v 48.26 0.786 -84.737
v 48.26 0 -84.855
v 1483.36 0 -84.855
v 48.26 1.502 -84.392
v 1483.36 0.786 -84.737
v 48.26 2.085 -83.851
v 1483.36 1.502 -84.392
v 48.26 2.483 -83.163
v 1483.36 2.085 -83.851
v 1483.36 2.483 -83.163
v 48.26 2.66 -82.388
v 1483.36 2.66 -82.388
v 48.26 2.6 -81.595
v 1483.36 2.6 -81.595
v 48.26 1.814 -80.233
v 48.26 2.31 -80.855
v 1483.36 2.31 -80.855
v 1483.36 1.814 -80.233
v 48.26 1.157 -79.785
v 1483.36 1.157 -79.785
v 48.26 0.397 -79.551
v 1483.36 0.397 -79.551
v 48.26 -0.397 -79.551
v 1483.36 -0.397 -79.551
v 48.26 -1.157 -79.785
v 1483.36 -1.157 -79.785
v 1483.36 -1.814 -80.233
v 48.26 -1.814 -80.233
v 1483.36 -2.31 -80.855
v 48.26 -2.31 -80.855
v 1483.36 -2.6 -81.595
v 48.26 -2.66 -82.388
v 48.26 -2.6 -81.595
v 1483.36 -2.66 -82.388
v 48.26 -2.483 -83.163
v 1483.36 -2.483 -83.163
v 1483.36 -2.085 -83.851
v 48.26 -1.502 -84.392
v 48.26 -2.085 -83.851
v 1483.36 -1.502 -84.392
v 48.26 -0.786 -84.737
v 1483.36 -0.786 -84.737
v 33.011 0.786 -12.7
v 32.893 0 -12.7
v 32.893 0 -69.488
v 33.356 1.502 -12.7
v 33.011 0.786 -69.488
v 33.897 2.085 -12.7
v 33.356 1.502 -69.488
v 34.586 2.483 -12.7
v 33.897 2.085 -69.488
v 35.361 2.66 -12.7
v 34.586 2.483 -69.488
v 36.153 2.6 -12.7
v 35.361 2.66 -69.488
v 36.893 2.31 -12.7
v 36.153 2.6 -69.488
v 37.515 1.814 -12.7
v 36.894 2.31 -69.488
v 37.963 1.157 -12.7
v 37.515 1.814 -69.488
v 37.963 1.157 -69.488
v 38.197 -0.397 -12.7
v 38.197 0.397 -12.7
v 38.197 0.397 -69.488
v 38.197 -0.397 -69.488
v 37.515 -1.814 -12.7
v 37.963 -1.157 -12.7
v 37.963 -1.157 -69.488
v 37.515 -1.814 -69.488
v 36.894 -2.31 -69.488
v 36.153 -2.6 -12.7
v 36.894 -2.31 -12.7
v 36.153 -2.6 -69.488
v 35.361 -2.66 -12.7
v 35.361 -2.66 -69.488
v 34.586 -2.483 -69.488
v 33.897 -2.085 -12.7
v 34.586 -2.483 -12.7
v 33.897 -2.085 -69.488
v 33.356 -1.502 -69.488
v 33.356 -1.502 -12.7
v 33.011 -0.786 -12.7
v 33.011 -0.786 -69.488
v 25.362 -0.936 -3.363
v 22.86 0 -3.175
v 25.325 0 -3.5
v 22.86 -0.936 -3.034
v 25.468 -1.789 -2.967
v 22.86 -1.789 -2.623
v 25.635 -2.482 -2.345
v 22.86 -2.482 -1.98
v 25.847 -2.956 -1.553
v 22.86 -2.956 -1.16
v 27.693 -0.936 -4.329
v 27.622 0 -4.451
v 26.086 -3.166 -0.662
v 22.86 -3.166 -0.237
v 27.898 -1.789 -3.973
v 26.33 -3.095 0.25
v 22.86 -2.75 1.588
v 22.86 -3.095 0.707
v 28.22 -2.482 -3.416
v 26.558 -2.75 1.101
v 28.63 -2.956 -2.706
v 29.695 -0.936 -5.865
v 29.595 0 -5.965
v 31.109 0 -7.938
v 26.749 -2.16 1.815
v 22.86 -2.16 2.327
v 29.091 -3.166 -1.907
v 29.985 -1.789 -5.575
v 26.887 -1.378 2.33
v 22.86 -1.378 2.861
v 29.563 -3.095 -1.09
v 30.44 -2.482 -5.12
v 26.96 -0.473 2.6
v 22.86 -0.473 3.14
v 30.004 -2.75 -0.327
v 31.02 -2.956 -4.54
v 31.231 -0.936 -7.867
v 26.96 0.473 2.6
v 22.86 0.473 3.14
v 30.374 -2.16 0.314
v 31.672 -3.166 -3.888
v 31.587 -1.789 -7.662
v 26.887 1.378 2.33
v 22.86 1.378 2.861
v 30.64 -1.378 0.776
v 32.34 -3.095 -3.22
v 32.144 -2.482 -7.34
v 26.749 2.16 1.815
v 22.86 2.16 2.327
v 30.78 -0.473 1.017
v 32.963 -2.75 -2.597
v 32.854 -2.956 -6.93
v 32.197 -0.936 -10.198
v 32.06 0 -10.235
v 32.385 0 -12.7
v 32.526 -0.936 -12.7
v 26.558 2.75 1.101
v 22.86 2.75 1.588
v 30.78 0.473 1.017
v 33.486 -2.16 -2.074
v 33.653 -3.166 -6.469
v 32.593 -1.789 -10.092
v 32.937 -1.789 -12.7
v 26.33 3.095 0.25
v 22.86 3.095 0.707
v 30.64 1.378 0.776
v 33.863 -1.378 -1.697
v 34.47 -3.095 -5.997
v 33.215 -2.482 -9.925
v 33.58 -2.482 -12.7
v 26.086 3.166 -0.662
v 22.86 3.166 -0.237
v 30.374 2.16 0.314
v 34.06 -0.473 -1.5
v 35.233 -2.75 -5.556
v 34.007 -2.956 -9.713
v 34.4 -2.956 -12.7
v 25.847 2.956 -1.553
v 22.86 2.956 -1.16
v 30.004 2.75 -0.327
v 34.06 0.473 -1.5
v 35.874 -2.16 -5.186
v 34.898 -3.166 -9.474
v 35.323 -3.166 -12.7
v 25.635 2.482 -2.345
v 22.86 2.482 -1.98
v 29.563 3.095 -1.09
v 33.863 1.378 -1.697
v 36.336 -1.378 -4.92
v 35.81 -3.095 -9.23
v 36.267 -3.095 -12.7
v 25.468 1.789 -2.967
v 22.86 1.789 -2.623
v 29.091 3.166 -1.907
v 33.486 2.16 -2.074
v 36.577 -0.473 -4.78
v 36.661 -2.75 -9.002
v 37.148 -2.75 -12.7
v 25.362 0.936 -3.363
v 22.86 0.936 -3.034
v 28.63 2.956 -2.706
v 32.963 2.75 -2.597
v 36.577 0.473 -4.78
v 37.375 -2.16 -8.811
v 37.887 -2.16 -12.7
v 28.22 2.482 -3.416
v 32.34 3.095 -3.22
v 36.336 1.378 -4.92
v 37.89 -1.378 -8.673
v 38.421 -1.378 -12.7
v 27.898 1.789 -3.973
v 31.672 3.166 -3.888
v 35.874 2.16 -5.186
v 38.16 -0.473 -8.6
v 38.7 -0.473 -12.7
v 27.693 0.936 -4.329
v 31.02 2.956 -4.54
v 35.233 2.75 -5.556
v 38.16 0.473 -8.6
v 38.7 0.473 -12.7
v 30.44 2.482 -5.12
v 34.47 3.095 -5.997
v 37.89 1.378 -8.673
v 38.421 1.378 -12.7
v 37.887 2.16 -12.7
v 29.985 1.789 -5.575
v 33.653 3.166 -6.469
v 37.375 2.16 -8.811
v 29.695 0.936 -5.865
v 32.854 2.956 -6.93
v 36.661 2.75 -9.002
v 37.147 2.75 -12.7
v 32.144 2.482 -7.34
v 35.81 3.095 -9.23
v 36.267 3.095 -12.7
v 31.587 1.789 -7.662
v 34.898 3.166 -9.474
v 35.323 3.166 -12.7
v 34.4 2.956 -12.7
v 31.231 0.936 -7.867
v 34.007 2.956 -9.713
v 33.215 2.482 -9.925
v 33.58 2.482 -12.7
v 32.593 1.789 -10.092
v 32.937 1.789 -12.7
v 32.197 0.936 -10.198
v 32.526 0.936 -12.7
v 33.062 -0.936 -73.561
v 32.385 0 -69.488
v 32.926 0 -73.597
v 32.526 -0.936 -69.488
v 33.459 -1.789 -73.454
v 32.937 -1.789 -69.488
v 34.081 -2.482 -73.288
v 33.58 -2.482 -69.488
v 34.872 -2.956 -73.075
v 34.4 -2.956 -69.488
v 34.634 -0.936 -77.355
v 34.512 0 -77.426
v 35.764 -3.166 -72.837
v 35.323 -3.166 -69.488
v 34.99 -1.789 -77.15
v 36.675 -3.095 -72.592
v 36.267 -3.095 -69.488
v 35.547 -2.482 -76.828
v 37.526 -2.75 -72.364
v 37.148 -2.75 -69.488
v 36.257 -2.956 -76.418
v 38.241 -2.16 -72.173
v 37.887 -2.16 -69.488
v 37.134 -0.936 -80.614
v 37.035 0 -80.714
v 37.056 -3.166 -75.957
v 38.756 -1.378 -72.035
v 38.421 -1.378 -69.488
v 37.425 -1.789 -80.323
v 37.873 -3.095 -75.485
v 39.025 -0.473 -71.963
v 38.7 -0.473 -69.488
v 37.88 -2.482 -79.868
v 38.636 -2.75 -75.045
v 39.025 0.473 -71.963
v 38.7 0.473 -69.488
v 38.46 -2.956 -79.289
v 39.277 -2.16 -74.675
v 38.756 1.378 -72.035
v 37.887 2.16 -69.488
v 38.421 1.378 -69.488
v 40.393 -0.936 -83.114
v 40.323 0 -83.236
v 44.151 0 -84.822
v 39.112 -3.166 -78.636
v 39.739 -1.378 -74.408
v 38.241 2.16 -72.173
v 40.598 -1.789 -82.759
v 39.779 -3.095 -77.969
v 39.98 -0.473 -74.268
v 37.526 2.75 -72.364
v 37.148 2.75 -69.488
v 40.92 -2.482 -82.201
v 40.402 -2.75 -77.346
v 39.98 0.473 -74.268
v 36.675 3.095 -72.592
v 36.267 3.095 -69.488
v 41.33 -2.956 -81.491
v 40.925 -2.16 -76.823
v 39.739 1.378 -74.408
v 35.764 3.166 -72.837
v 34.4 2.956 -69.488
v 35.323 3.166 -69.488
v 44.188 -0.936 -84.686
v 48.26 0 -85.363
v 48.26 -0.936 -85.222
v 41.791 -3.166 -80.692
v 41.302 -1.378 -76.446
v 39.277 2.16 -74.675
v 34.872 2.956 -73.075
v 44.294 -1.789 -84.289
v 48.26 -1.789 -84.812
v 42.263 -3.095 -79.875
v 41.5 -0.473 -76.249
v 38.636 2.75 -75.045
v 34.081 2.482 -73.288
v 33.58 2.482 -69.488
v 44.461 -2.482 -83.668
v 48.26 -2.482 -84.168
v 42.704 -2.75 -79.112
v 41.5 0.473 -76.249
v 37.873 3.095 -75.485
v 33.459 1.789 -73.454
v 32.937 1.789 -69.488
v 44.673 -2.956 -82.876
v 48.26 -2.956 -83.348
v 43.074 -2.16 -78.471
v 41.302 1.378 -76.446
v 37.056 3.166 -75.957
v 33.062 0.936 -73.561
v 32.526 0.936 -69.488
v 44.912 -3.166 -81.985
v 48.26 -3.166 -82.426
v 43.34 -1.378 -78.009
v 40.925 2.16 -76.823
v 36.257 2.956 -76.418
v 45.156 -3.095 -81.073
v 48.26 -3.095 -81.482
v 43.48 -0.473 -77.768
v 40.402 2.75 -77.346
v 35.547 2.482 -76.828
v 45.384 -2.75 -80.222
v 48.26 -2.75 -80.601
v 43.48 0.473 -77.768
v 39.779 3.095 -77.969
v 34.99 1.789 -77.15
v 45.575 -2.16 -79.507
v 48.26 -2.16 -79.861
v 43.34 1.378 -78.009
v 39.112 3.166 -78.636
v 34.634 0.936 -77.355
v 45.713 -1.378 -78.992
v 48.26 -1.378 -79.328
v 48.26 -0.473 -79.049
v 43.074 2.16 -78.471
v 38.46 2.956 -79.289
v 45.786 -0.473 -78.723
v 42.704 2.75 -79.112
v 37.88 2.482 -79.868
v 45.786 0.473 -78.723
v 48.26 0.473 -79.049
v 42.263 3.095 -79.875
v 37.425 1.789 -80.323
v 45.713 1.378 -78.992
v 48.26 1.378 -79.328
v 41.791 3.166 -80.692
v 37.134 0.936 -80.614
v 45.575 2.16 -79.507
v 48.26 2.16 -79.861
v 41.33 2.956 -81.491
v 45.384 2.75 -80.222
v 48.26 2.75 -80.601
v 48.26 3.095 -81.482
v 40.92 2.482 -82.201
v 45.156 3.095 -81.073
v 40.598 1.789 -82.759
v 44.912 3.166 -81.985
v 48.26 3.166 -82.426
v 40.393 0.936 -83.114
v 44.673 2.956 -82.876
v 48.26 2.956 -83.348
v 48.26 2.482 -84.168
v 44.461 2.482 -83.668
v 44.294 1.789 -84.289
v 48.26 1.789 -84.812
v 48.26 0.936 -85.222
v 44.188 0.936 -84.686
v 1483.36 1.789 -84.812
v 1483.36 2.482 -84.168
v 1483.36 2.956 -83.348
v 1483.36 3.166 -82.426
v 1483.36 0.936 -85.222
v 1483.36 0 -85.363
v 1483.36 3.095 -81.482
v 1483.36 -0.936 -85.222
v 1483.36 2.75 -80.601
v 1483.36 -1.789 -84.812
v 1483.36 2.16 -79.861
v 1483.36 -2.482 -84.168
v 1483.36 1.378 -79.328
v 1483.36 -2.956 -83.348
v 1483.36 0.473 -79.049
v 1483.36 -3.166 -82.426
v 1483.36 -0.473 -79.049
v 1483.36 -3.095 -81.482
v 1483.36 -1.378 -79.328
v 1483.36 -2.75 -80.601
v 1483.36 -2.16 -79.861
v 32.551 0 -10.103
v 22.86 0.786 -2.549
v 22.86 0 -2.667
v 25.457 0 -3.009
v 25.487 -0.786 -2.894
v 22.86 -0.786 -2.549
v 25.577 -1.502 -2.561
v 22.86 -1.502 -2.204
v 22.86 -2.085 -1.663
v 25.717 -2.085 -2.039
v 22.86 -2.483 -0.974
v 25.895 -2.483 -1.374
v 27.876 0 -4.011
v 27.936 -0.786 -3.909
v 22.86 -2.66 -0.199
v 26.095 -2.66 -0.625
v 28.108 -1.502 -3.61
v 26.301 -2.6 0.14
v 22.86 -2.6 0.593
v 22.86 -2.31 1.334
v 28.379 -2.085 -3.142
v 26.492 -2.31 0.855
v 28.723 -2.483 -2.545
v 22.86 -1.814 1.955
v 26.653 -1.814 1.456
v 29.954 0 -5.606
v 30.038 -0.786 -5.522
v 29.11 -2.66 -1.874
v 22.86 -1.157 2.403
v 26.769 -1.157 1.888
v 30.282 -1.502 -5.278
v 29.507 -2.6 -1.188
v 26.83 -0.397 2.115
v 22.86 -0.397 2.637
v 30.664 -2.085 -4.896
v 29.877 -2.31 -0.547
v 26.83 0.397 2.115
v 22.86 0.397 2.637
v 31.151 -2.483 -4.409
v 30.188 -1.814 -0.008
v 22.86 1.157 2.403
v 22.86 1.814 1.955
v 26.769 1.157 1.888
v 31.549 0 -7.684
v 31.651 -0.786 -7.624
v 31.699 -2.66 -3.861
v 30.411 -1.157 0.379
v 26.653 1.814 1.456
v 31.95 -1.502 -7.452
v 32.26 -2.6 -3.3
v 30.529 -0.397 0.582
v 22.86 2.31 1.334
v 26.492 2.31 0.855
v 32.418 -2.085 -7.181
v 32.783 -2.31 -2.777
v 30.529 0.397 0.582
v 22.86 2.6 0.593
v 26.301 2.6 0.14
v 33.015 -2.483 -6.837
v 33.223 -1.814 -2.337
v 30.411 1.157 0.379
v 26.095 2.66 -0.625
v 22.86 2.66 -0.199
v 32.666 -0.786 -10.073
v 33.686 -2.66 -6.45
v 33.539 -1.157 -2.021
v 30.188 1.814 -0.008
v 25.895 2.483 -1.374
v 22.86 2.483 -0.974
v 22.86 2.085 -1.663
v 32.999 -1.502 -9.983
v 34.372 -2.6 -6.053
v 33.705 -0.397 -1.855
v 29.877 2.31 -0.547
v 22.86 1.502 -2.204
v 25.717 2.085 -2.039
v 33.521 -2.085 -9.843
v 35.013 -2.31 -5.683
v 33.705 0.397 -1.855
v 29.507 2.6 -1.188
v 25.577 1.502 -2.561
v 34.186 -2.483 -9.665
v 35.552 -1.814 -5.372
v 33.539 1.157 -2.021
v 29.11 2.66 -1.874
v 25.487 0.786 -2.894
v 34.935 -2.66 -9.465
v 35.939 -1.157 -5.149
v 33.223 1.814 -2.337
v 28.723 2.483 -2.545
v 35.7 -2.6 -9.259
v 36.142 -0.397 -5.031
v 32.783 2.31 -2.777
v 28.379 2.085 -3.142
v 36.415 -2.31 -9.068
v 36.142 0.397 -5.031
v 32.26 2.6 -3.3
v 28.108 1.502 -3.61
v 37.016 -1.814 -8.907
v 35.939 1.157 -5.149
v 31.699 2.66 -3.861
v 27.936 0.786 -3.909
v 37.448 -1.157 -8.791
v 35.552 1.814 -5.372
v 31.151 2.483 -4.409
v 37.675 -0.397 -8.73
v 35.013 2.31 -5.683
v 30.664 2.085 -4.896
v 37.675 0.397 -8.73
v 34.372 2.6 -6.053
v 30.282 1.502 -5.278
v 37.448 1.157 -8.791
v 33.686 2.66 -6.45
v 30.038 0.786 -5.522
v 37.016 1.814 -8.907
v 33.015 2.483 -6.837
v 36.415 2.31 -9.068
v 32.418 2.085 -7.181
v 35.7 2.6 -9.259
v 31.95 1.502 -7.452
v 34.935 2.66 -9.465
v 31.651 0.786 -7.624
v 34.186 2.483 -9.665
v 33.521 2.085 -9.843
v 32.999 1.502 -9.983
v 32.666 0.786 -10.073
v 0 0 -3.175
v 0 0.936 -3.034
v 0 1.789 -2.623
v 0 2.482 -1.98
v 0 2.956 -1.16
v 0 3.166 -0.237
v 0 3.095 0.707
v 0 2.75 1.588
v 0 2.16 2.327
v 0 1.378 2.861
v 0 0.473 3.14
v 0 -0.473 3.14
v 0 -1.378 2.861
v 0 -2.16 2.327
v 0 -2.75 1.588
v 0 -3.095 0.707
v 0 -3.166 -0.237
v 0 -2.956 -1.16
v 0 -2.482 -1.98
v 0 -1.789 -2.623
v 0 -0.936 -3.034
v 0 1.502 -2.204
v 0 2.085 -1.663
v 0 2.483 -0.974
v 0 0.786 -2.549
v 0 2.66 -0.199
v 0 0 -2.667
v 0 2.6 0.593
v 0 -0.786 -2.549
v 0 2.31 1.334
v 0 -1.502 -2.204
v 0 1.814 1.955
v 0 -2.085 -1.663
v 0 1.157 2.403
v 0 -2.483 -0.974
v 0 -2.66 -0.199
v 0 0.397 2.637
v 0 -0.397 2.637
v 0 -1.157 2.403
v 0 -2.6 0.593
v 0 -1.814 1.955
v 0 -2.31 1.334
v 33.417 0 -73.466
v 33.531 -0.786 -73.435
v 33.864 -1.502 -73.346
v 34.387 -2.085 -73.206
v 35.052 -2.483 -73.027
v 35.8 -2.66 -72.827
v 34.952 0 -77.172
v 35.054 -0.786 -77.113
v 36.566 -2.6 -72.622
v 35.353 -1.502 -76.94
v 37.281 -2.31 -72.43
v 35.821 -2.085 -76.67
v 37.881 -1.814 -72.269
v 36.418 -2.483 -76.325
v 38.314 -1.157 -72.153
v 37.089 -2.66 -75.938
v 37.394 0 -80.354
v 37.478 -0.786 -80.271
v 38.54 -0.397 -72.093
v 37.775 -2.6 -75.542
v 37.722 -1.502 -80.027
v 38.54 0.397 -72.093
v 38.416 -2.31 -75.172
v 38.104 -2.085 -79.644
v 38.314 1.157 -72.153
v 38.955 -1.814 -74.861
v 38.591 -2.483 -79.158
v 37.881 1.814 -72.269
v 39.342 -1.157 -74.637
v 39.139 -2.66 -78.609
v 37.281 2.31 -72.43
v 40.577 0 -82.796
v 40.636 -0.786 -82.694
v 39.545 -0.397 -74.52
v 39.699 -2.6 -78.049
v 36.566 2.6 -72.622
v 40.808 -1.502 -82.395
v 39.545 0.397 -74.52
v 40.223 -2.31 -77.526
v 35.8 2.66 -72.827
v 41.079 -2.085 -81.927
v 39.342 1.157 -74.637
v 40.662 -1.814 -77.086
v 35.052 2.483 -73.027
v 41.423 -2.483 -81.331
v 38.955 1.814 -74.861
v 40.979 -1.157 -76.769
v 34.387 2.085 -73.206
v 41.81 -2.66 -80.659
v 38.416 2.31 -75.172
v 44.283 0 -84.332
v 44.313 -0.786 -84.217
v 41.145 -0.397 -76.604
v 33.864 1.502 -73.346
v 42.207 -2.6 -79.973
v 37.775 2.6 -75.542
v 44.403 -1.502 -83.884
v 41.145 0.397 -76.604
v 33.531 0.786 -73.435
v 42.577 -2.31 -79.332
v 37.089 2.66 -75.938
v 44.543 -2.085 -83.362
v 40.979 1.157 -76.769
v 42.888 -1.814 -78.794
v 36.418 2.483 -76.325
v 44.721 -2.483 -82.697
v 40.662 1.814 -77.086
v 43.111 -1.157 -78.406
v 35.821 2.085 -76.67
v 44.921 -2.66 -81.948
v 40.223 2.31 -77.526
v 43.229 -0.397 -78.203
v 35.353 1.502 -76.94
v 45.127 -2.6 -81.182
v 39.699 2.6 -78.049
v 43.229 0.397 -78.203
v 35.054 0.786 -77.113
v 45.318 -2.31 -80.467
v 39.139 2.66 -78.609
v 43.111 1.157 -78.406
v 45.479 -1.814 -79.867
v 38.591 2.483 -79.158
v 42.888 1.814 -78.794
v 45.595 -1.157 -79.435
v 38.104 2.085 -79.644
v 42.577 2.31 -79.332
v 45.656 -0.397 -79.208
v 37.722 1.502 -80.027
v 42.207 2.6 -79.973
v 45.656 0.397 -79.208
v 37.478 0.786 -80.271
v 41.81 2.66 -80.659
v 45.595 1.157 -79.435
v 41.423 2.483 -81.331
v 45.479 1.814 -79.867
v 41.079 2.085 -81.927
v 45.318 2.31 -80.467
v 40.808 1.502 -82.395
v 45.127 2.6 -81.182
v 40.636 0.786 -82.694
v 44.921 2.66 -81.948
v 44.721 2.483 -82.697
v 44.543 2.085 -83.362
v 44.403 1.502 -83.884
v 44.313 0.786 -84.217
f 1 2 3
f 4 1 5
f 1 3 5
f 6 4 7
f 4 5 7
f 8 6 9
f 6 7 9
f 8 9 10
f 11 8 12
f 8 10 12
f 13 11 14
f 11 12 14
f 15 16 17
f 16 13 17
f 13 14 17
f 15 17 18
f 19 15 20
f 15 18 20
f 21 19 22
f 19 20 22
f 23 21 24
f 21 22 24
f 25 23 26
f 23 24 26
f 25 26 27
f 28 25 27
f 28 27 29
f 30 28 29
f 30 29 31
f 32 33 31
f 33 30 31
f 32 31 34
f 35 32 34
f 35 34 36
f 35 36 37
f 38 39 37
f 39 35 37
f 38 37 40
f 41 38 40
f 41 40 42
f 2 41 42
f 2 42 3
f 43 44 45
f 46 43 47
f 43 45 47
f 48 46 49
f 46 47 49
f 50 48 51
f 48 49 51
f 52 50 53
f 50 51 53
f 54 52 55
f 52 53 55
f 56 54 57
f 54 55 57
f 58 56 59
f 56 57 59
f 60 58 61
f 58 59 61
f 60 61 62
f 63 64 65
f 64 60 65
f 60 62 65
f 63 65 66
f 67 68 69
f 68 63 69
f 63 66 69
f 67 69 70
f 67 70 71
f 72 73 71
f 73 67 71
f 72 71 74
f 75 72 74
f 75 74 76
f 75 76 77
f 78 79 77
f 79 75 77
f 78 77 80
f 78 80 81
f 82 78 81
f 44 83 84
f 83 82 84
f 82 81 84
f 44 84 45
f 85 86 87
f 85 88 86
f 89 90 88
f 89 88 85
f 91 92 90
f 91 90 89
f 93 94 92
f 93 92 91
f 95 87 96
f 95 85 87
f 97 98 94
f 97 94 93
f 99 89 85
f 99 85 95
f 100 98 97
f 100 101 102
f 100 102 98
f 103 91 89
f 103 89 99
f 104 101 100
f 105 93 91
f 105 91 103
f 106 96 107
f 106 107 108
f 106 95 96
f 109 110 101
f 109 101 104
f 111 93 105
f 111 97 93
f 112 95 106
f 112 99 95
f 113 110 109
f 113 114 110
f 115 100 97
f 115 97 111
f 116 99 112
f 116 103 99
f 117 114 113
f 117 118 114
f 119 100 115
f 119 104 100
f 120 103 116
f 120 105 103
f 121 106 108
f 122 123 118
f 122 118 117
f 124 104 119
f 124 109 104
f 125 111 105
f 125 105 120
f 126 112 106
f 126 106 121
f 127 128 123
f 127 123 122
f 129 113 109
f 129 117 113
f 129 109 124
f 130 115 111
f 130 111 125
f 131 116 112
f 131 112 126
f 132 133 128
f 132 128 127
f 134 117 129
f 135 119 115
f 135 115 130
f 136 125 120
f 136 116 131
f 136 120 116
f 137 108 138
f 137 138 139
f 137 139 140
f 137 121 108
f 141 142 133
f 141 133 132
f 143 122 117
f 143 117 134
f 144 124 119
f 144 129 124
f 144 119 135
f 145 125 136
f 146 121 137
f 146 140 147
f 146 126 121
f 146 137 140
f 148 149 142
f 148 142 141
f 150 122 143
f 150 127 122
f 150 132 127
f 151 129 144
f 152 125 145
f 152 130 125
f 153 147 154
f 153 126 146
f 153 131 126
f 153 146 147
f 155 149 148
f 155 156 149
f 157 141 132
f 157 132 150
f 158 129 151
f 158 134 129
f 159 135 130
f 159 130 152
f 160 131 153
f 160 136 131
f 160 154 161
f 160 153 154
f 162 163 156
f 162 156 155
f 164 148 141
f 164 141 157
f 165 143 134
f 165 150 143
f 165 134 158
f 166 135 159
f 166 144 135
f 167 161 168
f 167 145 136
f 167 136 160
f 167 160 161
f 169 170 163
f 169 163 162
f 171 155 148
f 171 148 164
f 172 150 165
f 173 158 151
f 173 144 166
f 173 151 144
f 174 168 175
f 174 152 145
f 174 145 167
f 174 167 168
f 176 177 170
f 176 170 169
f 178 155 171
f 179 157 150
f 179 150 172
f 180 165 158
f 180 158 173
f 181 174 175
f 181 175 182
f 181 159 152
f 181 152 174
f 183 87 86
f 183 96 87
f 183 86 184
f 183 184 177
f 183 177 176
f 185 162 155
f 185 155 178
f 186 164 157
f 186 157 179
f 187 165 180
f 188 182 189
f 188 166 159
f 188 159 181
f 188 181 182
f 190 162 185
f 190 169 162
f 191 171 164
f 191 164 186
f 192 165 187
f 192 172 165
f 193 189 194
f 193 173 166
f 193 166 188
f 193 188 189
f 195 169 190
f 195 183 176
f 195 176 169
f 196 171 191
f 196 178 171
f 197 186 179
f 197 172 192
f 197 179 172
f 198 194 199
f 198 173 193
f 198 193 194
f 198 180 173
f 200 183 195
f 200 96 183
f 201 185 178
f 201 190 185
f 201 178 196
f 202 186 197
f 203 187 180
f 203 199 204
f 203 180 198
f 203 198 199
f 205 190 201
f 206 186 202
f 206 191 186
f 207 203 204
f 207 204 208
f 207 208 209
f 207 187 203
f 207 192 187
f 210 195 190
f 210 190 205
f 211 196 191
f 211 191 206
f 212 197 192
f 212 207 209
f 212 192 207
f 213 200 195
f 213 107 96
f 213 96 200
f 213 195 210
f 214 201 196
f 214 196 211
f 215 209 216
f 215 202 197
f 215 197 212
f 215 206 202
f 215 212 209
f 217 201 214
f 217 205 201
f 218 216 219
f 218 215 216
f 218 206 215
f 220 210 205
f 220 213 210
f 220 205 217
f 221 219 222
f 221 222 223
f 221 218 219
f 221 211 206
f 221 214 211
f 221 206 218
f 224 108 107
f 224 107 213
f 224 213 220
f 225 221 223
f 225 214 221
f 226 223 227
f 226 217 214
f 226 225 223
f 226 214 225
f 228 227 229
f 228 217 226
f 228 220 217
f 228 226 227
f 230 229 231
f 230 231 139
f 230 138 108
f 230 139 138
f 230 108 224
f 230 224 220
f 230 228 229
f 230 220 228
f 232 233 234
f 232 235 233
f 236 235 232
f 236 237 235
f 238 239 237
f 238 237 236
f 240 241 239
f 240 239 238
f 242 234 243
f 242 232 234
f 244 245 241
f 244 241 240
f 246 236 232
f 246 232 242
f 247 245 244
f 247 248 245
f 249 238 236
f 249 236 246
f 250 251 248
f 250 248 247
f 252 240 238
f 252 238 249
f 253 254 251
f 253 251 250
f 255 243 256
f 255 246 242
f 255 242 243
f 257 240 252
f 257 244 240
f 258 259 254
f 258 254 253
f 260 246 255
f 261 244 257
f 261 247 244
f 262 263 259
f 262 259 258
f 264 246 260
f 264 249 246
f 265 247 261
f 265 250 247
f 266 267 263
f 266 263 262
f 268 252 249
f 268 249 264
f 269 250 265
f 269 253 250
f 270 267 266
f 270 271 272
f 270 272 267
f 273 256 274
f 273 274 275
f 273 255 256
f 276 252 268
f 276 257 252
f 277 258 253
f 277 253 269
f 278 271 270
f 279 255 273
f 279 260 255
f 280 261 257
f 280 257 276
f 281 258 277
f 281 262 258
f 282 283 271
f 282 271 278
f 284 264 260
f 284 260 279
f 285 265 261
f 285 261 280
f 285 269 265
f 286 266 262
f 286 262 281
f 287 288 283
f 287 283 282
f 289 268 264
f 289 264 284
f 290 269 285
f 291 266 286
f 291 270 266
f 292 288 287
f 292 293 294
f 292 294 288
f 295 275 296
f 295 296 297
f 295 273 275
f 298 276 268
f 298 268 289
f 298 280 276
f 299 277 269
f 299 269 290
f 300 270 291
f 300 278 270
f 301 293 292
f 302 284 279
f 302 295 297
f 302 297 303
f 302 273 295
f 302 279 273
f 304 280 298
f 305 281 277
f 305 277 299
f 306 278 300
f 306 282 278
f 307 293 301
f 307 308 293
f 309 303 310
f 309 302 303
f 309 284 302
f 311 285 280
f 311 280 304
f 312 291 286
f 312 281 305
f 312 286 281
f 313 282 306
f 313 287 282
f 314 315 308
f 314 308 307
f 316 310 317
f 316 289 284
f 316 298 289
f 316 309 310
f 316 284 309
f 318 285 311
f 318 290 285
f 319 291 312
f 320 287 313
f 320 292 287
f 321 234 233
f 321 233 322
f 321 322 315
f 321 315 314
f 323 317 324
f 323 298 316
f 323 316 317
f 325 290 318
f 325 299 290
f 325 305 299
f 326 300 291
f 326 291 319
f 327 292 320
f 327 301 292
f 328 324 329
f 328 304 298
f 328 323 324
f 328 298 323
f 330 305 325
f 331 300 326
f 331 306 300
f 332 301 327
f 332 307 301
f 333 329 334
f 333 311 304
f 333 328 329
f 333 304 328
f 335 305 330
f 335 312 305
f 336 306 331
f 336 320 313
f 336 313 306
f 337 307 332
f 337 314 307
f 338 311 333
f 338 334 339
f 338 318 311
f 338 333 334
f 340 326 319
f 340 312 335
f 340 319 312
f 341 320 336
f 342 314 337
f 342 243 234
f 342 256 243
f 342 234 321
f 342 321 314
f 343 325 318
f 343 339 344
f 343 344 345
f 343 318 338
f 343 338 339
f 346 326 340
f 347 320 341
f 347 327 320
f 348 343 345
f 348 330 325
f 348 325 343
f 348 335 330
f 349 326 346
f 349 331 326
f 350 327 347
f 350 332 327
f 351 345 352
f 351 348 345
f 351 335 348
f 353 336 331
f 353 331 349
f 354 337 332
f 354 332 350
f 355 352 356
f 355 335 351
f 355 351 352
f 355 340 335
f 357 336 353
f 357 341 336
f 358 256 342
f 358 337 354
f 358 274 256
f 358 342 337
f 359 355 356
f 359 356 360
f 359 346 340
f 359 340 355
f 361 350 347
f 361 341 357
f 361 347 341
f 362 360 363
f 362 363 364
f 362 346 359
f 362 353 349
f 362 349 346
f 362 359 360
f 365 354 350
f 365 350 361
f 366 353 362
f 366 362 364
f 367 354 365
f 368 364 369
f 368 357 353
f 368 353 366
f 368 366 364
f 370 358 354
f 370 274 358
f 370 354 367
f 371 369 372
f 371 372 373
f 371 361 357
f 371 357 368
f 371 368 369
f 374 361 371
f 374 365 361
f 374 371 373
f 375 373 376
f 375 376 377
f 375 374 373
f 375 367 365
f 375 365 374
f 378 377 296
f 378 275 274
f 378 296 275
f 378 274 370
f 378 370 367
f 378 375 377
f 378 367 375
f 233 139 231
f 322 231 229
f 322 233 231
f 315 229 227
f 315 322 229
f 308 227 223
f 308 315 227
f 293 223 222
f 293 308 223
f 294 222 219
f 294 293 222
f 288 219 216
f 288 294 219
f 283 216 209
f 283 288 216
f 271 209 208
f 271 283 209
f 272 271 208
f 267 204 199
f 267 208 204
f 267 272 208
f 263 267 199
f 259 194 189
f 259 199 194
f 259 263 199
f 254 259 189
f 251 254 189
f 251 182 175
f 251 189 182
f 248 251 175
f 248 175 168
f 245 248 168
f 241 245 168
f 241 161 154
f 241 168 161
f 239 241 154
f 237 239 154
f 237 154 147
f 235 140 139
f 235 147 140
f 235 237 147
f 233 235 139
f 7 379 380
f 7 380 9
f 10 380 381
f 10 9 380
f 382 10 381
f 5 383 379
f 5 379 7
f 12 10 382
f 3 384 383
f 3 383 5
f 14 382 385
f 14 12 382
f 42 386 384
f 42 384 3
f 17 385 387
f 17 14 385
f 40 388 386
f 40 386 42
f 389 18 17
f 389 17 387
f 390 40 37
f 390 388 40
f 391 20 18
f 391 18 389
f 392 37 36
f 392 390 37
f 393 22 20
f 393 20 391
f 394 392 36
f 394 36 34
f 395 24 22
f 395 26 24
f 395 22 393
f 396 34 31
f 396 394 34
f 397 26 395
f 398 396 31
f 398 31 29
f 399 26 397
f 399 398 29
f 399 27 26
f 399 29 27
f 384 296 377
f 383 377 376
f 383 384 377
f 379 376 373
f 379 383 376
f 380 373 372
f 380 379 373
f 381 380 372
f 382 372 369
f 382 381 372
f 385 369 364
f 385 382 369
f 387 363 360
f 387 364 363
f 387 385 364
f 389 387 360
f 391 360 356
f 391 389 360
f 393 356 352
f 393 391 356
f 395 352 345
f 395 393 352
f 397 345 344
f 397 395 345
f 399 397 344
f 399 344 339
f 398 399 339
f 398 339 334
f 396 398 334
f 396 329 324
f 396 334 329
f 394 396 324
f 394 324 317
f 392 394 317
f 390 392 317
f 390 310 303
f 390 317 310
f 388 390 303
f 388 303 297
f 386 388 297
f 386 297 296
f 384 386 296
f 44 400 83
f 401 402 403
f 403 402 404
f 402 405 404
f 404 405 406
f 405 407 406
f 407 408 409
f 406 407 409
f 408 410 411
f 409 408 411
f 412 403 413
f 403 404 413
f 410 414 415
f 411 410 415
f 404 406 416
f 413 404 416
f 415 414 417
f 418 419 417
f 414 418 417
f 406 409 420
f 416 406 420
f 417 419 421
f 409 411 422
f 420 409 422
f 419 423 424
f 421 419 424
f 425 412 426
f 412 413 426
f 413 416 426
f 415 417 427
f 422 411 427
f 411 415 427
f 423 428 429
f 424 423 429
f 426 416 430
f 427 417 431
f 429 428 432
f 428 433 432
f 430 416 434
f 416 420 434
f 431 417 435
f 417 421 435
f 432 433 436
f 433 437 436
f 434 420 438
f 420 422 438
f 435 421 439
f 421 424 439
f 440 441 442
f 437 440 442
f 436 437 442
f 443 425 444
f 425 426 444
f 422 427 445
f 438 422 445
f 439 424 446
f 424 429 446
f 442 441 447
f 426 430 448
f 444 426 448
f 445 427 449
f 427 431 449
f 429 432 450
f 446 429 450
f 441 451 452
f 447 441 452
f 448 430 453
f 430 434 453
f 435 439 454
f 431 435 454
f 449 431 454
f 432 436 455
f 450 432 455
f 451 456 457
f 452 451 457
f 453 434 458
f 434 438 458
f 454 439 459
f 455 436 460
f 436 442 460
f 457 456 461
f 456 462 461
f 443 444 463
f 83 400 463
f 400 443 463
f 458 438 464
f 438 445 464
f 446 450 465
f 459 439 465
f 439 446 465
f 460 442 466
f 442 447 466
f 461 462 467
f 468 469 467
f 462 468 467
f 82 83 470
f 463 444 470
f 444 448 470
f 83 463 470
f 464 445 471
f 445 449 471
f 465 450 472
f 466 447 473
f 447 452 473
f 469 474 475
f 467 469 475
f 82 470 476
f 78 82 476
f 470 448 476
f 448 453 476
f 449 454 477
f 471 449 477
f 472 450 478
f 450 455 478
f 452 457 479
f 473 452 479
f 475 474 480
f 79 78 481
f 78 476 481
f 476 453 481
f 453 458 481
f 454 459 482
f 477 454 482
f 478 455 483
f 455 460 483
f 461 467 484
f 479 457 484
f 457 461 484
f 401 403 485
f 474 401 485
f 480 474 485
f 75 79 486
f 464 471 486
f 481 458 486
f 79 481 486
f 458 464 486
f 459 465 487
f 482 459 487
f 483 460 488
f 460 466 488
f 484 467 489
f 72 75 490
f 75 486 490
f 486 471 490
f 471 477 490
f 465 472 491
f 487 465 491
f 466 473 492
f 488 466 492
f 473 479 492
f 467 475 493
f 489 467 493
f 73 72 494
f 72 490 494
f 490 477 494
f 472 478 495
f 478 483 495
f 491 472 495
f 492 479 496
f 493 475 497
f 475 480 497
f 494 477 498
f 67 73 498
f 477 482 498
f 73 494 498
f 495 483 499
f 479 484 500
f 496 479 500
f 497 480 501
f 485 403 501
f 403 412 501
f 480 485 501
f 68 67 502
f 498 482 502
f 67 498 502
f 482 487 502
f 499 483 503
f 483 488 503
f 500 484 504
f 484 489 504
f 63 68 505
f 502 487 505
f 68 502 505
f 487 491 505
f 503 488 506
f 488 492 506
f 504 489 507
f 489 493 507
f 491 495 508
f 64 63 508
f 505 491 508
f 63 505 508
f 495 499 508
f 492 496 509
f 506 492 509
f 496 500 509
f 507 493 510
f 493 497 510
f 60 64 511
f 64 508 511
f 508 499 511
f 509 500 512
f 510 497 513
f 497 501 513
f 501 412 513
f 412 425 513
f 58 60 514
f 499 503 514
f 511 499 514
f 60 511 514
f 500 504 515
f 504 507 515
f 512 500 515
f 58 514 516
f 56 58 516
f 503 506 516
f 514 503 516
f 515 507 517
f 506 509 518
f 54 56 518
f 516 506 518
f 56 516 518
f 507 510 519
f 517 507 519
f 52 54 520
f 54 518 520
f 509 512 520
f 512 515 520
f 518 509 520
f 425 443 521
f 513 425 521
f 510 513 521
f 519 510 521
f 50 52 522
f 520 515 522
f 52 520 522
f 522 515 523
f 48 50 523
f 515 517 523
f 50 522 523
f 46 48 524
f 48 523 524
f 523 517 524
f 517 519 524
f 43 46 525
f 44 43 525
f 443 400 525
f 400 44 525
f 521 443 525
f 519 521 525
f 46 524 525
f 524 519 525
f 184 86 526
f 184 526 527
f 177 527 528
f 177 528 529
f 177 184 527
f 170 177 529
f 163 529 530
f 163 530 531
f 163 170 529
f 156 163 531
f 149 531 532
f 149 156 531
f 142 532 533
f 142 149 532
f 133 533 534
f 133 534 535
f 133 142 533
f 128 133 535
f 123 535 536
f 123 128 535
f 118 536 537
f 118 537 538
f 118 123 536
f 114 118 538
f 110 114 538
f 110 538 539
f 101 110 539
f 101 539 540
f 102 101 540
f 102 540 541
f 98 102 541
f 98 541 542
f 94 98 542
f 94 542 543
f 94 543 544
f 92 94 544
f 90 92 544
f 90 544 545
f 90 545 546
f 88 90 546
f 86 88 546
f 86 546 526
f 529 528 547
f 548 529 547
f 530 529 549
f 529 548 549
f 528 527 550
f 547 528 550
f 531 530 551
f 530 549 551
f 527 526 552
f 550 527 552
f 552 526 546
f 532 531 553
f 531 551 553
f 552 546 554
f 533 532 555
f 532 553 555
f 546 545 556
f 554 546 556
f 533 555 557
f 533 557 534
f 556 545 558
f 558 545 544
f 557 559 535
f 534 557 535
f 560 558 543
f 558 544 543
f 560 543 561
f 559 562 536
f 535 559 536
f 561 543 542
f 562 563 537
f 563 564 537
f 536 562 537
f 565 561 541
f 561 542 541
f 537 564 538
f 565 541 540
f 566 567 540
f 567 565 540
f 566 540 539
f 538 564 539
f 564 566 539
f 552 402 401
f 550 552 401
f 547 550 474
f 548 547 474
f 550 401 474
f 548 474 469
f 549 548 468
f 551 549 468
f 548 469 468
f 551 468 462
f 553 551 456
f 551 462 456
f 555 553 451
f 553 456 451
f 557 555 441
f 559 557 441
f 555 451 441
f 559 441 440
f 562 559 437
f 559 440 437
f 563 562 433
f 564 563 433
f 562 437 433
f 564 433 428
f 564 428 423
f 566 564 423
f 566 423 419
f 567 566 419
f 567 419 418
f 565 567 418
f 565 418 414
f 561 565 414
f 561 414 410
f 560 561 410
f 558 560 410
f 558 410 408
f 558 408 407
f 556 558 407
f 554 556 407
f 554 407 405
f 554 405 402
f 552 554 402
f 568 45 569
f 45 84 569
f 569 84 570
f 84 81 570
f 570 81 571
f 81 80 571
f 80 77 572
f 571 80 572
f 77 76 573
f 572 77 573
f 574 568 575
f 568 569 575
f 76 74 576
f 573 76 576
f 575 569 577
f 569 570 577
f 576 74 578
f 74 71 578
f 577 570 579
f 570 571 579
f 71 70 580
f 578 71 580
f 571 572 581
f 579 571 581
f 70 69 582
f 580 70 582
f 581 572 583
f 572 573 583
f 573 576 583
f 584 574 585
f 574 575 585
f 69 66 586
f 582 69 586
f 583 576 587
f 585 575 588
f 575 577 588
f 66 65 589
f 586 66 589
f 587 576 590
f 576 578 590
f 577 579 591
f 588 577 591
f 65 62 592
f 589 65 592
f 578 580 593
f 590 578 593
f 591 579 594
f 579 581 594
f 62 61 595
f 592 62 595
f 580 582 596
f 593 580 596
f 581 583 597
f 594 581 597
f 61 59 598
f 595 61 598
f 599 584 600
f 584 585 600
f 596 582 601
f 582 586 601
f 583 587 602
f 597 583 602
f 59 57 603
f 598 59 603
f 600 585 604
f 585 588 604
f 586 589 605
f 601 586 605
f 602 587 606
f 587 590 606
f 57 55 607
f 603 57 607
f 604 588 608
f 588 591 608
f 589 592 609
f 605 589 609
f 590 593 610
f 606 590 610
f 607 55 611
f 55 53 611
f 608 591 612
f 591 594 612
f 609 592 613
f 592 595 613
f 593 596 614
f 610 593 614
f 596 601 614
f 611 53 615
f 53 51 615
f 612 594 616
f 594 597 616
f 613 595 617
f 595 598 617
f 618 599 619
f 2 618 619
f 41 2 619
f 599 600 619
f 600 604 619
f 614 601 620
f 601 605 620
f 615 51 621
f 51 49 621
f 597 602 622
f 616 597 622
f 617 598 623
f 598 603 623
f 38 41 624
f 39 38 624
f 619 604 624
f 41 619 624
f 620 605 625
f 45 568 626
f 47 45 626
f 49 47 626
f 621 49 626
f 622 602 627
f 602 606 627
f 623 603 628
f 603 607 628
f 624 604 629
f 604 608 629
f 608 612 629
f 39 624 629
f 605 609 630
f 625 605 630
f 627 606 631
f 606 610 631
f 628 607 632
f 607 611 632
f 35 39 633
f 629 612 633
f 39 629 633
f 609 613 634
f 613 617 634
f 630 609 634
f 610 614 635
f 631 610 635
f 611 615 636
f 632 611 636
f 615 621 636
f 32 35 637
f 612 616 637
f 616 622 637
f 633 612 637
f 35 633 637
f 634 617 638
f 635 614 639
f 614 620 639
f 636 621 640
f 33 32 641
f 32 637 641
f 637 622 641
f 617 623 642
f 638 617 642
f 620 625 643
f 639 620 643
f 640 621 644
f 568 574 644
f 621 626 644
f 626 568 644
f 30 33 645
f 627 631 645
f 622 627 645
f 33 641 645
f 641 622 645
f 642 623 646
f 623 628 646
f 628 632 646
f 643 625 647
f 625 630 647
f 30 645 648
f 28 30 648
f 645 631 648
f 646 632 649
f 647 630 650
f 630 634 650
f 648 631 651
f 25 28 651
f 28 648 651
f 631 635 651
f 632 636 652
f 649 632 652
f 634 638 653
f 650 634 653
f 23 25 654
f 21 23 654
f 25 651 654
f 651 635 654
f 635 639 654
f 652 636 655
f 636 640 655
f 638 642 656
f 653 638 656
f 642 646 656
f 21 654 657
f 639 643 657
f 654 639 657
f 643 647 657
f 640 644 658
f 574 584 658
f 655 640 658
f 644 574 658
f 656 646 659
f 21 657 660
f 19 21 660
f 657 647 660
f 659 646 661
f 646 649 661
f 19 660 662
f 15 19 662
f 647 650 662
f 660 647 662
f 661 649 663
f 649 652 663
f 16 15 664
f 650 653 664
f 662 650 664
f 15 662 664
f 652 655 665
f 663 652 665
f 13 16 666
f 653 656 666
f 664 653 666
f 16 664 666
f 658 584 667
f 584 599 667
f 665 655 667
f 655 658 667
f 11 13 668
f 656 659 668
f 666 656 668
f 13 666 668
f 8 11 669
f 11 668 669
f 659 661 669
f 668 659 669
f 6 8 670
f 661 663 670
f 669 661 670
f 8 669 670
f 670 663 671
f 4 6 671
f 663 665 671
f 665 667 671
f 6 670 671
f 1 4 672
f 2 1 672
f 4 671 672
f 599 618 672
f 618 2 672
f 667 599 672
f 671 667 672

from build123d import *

# Parameters (mm, degrees)
SKETCH5_R   = 3.175
SKETCH5_R_2 = 2.667


with BuildPart() as part:
    # Sweep3: sweep along a curve in space
    with BuildLine() as sweep3_path:
        Line((0, 0, 0), (22.86, 0, 0))
        ThreePointArc((22.86, 0, 0), (31.840256121, 0, -3.719743879), (35.56, 0, -12.7))
        Line((35.56, 0, -12.7), (35.56, 0, -69.48826463))
        ThreePointArc((35.56, 0, -69.48826463), (39.279743879, 0, -78.468520751), (48.26, 0, -82.18826463))
        Line((48.26, 0, -82.18826463), (1483.36, 0, -82.18826463))
    # Sketch5 → Sweep3 (sweep)
    with BuildSketch(Plane(origin=(0, 0, 0), x_dir=(0, 0, -1), z_dir=(1, 0, 0))):
        Circle(SKETCH5_R)
        Circle(SKETCH5_R_2, mode=Mode.SUBTRACT)
    sweep(path=sweep3_path.line)


solid = part.part
